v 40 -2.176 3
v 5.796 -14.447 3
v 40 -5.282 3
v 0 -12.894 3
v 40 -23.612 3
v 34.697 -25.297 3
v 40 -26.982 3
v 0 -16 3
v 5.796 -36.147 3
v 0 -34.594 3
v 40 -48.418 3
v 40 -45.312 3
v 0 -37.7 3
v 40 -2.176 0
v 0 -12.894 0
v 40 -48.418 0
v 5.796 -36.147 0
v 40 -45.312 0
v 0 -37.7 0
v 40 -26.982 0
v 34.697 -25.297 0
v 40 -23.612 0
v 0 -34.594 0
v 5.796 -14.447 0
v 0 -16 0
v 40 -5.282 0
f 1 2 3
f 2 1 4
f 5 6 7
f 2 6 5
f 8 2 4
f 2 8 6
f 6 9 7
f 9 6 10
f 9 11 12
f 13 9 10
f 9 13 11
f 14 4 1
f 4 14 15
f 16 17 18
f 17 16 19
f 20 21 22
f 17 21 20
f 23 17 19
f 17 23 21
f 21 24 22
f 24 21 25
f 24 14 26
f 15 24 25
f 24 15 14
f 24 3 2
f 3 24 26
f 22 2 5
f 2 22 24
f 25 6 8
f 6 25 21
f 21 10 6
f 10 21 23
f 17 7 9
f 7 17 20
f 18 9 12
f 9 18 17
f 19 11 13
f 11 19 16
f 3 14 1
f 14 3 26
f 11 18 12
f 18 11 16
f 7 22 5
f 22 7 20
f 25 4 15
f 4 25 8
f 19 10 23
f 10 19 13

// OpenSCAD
difference(){
union(){
  translate([0,-16,0]) rotate([0,0,15]) cube([43,3,3]);
  translate([0,-16,0]) rotate([0,0,-15]) cube([43,3,3]);

 translate([0,-37.7,0]) rotate([0,0,15]) cube([43,3,3]);

 translate([0,-37.7,0])
  rotate([0,0,-15]) cube([43,3,3]);
}
 translate([40,-60,-1]) cube([5,60,6]);
 translate([-5,-60,-1]) cube([5,60,6]);
}
